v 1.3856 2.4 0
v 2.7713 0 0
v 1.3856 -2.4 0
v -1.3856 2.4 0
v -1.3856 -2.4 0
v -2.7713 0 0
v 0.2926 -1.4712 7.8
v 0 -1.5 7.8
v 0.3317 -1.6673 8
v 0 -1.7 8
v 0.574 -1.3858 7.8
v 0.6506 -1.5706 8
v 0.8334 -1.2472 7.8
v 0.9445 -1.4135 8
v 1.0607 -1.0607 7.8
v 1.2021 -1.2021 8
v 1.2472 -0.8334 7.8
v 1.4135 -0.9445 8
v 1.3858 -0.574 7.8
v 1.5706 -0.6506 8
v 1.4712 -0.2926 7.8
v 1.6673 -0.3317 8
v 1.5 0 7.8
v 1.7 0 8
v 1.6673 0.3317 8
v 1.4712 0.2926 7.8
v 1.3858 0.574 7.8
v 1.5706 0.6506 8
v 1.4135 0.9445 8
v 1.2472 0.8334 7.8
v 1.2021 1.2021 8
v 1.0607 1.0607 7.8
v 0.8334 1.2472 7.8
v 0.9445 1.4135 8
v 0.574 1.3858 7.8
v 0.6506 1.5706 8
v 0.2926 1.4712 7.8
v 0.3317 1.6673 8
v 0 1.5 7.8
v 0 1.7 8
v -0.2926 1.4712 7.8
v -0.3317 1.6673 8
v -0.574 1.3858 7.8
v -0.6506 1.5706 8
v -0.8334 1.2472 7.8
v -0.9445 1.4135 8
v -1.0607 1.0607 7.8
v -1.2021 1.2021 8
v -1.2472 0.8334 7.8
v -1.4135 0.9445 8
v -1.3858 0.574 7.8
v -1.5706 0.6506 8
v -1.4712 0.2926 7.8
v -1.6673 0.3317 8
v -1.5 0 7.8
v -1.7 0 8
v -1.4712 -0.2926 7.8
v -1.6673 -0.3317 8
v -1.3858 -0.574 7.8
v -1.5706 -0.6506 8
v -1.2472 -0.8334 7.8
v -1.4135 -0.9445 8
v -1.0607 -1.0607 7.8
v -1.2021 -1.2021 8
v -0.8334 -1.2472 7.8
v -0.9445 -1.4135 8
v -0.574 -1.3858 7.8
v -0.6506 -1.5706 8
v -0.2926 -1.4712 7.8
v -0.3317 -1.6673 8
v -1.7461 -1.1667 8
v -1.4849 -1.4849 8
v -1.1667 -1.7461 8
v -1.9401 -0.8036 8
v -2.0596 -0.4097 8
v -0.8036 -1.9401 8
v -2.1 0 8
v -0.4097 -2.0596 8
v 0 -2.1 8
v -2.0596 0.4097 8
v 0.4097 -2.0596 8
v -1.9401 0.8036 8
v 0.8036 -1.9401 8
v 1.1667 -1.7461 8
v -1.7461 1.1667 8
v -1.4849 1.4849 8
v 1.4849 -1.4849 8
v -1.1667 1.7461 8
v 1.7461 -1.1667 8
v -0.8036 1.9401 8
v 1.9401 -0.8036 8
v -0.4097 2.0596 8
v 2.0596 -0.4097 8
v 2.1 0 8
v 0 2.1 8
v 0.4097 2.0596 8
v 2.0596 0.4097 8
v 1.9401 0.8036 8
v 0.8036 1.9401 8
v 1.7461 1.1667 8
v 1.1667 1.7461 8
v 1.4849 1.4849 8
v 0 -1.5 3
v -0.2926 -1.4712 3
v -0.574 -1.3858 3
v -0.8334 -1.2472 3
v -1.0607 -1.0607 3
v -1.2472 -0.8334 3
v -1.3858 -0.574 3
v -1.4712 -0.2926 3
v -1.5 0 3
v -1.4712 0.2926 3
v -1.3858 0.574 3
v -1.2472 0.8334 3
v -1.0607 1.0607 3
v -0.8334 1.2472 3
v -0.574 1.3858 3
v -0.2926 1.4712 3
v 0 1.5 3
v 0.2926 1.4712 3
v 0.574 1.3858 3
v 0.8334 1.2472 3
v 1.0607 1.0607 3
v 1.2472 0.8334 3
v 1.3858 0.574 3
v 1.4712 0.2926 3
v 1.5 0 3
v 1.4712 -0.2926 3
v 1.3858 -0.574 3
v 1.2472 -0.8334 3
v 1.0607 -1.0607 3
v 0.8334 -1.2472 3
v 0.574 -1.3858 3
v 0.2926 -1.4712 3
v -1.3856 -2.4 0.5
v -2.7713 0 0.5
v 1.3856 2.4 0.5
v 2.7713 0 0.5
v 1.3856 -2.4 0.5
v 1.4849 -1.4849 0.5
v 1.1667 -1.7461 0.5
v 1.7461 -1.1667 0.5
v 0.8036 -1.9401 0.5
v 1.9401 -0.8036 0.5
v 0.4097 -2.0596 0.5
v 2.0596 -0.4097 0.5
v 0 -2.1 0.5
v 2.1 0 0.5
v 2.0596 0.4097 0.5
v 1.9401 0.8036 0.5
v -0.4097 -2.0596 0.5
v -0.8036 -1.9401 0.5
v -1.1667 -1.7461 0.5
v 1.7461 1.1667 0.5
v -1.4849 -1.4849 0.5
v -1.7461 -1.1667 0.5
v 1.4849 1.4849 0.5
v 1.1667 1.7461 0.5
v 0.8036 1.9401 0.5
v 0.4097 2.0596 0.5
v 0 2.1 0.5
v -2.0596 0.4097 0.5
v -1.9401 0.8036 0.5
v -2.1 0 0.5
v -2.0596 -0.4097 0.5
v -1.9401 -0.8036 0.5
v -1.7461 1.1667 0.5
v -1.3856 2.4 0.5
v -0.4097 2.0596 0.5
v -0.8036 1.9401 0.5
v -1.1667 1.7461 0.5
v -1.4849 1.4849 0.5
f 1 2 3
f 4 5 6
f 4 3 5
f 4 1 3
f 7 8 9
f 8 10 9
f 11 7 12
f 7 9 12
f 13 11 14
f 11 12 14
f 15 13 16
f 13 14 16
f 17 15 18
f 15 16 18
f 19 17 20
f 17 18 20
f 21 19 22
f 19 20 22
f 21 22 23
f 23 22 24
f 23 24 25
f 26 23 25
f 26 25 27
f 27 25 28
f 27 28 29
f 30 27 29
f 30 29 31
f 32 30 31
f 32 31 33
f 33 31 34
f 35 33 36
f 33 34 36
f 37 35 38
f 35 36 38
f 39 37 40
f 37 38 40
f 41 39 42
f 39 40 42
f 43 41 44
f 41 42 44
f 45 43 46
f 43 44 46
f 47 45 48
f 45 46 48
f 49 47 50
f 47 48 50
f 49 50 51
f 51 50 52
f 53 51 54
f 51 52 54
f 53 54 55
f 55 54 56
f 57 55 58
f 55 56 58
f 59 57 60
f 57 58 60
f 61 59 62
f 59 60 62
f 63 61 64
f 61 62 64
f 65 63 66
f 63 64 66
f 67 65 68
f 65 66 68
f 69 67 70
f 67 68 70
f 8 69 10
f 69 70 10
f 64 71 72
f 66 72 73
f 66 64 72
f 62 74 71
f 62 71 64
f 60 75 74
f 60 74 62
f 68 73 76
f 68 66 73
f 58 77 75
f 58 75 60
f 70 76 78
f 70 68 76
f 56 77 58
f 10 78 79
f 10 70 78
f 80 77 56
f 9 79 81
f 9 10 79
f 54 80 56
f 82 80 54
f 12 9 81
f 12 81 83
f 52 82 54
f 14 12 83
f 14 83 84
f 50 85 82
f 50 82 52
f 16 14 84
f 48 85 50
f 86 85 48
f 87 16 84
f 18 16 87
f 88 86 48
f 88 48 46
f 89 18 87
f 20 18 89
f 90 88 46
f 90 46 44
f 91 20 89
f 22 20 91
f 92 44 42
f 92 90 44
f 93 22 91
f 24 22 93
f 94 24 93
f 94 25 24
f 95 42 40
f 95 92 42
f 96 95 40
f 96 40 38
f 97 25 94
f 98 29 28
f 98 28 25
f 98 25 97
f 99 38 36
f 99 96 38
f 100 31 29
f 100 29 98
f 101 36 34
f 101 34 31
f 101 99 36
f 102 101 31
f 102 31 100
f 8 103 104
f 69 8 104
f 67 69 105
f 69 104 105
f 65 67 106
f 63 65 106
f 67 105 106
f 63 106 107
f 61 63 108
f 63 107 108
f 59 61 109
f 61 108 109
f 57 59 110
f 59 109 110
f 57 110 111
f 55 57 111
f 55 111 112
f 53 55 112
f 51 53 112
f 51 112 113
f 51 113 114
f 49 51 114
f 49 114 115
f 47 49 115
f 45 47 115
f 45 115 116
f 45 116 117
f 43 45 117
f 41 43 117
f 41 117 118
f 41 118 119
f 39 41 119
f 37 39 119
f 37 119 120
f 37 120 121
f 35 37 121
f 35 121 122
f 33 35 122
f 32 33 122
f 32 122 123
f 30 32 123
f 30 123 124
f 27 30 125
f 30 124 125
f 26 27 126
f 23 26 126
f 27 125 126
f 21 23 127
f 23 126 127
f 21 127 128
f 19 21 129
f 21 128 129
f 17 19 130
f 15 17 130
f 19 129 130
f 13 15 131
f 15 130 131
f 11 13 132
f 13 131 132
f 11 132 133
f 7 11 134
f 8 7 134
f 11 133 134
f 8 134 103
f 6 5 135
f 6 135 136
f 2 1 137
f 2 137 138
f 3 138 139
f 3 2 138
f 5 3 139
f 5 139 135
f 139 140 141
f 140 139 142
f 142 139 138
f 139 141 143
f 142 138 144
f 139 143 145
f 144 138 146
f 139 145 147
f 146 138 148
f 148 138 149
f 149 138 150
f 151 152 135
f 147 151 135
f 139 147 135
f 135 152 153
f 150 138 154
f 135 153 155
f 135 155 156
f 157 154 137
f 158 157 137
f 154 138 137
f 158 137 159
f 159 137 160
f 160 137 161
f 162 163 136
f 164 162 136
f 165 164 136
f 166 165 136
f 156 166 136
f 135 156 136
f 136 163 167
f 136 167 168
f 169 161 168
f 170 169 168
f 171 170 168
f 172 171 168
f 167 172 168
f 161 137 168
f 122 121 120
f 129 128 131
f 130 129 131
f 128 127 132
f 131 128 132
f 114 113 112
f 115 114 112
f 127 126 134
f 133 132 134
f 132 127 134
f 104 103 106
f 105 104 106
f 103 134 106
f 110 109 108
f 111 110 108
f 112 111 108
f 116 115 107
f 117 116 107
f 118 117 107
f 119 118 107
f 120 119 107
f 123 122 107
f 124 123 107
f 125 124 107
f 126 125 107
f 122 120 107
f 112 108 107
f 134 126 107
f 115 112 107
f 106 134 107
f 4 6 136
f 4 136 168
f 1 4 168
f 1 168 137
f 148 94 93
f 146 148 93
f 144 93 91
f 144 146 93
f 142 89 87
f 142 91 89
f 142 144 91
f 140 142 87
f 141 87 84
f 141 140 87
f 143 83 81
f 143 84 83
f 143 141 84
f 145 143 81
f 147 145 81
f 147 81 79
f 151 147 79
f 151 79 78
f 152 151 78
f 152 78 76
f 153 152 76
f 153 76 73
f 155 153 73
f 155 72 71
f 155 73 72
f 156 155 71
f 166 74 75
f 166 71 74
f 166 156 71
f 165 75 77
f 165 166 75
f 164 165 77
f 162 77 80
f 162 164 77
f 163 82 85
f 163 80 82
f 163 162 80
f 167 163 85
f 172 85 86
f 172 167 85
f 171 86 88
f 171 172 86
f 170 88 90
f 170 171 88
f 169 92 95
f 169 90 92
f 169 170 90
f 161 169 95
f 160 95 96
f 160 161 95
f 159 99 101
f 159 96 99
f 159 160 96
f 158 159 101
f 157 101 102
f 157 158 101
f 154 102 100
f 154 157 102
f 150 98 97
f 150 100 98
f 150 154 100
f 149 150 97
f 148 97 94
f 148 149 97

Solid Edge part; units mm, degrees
sketch "Sketch1" plane through (0, 0, 0) normal (0, 0, 1) x (1, 0, 0)
  line L0 (-1.3856, 2.4) -> (1.3856, 2.4)
  line L1 (1.3856, 2.4) -> (2.7713, 0)
  line L2 (2.7713, 0) -> (1.3856, -2.4)
  line L3 (1.3856, -2.4) -> (-1.3856, -2.4)
  line L4 (-1.3856, -2.4) -> (-2.7713, 0)
  line L5 (-2.7713, 0) -> (-1.3856, 2.4)
  dimension "D1" = 4.8
extrude "Protrusion1" add sketch "Sketch1" along normal blind 0.5
sketch "Sketch2" plane through (0, 0, 0.5) normal (0, 0, 1) x (1, 0, 0)
  circle A0 centre (0, 0) radius 2.1
  dimension "D1" = 4.2
extrude "Ausprägung_2" add sketch "Sketch2" along normal blind 7.5
hole "Bohrung_1" at (0, 0, 8) direction (0, 0, -1) diameter 3 depth 5
chamfer "Fase_1" distance 0.2 angle 45 1 edges at (0, 1.5, 8)
